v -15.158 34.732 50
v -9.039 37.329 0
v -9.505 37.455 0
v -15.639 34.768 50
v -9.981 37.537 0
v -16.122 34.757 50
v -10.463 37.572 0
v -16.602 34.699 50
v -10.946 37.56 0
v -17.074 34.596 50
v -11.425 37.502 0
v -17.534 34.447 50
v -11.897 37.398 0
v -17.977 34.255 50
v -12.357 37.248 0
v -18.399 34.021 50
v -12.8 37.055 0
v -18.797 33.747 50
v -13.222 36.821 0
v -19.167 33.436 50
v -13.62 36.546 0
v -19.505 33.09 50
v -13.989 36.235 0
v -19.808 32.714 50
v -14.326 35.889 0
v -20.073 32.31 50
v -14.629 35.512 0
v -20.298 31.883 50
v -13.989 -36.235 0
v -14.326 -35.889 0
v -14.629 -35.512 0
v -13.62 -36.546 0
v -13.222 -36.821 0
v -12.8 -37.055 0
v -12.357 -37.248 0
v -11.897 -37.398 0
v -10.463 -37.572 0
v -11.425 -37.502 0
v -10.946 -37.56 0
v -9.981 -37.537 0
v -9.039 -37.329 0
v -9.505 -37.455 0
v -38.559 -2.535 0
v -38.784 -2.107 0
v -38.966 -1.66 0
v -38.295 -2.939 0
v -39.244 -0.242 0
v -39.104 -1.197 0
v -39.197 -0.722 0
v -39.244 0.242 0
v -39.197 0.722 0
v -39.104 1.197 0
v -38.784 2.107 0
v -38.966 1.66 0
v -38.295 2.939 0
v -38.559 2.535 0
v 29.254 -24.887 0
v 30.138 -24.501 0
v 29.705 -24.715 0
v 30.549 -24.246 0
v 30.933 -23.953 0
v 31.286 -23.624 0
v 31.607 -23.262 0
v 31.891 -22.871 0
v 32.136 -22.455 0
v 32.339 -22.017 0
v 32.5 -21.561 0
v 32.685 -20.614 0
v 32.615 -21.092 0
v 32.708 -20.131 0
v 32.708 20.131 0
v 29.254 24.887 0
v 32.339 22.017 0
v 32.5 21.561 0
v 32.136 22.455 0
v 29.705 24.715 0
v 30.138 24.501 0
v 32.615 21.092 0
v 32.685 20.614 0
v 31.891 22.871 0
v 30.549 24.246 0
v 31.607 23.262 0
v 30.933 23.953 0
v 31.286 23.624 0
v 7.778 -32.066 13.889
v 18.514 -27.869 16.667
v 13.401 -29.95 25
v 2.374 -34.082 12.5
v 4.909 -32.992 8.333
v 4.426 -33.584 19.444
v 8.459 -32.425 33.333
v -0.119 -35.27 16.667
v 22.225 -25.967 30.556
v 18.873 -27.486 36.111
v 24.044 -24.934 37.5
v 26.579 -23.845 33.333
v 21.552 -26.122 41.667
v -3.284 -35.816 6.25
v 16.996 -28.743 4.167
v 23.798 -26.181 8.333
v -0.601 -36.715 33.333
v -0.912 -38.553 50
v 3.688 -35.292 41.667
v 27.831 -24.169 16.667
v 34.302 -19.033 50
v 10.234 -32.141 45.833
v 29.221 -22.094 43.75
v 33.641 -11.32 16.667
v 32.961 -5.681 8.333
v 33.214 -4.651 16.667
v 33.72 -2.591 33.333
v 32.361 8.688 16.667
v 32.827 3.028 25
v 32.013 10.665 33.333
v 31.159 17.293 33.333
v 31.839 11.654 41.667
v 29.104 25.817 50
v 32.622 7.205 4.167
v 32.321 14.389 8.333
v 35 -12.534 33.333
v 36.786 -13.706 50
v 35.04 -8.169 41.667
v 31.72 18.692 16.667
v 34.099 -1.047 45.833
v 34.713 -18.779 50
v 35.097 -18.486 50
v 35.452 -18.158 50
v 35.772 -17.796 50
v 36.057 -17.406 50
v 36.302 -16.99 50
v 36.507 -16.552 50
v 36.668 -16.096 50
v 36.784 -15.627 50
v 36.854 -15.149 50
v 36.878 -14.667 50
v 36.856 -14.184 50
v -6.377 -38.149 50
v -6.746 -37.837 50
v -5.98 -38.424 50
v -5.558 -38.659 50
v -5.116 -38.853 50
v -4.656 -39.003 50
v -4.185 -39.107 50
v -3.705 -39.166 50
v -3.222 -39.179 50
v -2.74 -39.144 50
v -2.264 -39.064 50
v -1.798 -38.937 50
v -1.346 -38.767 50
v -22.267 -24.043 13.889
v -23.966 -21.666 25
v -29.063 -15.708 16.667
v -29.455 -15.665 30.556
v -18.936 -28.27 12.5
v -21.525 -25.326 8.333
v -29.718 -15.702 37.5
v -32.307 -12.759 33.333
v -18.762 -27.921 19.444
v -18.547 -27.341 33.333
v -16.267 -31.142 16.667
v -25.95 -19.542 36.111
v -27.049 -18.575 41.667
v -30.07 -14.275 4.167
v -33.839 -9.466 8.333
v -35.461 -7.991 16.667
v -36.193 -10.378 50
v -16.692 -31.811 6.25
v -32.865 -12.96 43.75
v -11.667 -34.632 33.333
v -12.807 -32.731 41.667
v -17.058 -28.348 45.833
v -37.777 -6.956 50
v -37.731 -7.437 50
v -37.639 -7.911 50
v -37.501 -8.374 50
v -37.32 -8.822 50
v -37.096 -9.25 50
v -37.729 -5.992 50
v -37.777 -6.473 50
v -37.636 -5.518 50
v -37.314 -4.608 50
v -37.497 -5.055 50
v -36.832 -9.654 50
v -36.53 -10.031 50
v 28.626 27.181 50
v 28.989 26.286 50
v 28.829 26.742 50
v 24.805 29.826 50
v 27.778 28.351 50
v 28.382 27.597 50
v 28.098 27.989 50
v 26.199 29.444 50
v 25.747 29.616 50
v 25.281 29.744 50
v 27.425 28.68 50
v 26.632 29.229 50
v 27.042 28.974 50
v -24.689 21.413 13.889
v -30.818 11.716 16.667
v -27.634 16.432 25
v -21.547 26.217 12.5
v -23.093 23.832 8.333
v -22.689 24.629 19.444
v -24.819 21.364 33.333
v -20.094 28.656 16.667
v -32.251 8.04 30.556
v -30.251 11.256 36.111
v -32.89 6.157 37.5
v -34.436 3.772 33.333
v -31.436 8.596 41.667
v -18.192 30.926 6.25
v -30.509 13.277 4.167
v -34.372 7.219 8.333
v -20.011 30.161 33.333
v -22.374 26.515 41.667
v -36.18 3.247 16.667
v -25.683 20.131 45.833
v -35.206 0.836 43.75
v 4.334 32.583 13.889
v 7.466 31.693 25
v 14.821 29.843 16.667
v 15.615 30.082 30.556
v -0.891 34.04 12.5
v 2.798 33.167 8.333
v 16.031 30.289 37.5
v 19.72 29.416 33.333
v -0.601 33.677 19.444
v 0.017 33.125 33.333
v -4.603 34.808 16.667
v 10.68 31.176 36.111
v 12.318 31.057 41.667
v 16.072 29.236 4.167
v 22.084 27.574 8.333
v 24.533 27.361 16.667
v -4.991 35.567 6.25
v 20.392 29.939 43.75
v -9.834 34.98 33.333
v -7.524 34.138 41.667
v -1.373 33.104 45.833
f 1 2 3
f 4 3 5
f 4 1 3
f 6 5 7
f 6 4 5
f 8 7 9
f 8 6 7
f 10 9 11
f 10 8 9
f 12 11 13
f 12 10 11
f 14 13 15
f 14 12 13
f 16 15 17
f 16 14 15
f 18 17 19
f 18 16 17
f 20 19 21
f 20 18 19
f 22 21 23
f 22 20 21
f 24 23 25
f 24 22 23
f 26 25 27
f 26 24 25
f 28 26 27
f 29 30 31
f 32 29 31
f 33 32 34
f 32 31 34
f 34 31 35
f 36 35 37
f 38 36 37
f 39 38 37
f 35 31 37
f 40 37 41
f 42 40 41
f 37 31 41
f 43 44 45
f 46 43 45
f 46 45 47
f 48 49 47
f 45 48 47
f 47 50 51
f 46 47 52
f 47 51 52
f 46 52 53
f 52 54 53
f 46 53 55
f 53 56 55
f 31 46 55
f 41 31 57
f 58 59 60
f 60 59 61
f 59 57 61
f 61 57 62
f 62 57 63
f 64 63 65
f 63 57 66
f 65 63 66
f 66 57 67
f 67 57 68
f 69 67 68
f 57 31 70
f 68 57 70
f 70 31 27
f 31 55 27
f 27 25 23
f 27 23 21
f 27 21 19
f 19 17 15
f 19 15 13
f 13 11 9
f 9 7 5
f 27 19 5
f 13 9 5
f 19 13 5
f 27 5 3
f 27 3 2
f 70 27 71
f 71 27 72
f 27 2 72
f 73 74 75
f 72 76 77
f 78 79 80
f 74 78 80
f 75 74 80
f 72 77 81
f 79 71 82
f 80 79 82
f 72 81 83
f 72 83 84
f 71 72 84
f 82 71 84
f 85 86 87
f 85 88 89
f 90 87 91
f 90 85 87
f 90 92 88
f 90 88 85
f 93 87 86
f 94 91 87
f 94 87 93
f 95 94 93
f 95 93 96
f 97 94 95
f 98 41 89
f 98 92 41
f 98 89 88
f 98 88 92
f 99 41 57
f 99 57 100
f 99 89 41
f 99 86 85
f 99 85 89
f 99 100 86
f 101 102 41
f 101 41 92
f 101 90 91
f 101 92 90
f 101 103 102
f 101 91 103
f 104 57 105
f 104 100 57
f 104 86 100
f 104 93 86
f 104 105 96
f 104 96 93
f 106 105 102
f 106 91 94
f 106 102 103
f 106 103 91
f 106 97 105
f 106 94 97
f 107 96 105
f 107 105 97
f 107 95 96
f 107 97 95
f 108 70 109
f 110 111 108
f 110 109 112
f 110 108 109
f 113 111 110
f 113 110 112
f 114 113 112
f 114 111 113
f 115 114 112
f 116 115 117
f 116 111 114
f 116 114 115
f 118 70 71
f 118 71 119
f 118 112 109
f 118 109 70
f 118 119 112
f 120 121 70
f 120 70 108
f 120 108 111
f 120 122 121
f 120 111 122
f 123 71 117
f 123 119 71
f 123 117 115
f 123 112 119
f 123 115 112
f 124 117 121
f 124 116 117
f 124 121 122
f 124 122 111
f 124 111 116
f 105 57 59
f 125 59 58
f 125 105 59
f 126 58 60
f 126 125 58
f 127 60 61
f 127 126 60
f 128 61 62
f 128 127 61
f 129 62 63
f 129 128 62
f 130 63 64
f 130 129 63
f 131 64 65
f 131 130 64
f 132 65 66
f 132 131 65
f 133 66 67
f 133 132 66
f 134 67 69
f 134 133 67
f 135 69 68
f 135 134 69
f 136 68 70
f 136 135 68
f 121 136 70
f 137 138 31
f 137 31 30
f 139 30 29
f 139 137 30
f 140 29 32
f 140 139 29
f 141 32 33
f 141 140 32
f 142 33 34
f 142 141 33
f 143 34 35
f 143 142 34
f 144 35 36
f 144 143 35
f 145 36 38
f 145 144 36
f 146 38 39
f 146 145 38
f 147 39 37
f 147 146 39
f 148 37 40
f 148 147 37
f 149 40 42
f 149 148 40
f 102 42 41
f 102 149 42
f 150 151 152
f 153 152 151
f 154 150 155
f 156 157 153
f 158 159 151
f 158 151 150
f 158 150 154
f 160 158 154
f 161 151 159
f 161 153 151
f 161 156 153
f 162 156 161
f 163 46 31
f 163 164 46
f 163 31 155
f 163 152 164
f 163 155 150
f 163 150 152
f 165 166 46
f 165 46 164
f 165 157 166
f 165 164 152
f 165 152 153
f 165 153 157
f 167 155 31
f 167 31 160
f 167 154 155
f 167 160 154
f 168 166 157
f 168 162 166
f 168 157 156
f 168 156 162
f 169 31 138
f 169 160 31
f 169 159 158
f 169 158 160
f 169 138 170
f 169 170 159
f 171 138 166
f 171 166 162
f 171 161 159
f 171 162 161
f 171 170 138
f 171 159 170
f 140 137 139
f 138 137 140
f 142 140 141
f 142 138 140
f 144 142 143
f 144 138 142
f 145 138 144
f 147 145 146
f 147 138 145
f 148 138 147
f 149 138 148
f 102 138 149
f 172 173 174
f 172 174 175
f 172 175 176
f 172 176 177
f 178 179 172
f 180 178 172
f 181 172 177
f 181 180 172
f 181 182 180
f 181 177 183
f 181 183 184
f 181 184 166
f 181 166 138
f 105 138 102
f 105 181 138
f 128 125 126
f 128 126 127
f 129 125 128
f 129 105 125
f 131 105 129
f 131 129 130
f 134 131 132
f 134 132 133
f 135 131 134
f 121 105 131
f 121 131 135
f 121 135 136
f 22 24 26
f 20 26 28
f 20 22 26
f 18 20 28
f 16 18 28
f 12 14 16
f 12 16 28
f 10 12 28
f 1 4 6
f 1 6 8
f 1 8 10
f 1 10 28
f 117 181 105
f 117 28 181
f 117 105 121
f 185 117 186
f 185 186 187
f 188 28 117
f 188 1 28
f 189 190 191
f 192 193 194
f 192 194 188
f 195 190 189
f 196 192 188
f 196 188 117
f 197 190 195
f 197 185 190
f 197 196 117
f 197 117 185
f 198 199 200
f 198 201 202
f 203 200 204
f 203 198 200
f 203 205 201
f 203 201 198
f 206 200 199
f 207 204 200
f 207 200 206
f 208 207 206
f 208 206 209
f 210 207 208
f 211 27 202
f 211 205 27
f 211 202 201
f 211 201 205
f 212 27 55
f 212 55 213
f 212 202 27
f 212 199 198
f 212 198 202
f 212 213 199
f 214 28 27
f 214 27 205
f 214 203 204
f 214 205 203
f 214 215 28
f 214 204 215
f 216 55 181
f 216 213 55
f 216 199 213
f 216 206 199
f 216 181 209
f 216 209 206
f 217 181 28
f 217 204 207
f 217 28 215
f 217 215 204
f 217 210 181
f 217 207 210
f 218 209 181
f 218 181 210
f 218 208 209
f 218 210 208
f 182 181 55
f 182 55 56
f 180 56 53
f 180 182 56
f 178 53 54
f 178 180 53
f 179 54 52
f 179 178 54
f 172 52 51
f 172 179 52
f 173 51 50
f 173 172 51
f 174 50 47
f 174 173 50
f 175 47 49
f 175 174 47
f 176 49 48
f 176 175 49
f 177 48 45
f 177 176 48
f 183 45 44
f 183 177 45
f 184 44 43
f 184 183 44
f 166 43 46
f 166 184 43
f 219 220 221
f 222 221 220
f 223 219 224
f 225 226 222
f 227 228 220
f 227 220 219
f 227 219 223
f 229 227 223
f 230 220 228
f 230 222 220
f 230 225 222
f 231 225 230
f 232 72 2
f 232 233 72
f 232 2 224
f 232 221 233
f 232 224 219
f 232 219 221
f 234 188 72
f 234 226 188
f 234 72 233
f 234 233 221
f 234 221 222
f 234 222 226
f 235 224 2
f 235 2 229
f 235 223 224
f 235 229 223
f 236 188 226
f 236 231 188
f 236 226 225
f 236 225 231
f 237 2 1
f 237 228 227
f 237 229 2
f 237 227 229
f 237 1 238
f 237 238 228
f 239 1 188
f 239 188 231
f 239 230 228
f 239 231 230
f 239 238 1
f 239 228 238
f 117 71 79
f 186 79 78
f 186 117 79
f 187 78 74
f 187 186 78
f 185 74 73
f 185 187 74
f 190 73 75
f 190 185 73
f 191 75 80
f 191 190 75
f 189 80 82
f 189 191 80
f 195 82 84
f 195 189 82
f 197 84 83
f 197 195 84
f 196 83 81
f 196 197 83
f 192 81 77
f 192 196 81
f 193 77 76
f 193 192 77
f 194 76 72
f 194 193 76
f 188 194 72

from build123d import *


with BuildPart() as f3:
    # F0 (on Top) → F3 section 0
    with BuildSketch(Plane.XY):
        with BuildLine():
            Line((32.708492, -20.131398), (32.708492, 20.131398))
            ThreePointArc((32.708492, 20.131398), (31.753577, 23.070324), (29.253577, 24.886681))
            Line((29.253577, 24.886681), (-9.038617, 37.328569))
            ThreePointArc((-9.038617, 37.328569), (-12.128787, 37.328569), (-14.628787, 35.512212))
            Line((-14.628787, 35.512212), (-38.294665, 2.938926))
            ThreePointArc((-38.294665, 2.938926), (-39.24958, 0), (-38.294665, -2.938926))
            Line((-38.294665, -2.938926), (-14.628787, -35.512212))
            ThreePointArc((-14.628787, -35.512212), (-12.128787, -37.328569), (-9.038617, -37.328569))
            Line((-9.038617, -37.328569), (29.253577, -24.886681))
            ThreePointArc((29.253577, -24.886681), (31.753577, -23.070324), (32.708492, -20.131398))
        make_face()
    # F2 (on offset) → F3 section 1
    with BuildSketch(Plane.XY.offset(50)):
        with BuildLine():
            Line((-20.298446, 31.882753), (-37.314239, -4.607732))
            ThreePointArc((-37.314239, -4.607732), (-37.690836, -7.674868), (-36.192692, -10.377592))
            Line((-36.192692, -10.377592), (-6.746347, -37.836753))
            ThreePointArc((-6.746347, -37.836753), (-3.945702, -39.142715), (-0.912307, -38.553083))
            Line((-0.912307, -38.553083), (34.302327, -19.033292))
            ThreePointArc((34.302327, -19.033292), (36.409818, -16.773285), (36.786415, -13.706148))
            Line((36.786415, -13.706148), (29.103911, 25.816906))
            ThreePointArc((29.103911, 25.816906), (27.605767, 28.51963), (24.805122, 29.825592))
            Line((24.805122, 29.825592), (-15.157561, 34.732393))
            ThreePointArc((-15.157561, 34.732393), (-18.190956, 34.142761), (-20.298446, 31.882753))
        make_face()
    loft()


solid = f3.part
